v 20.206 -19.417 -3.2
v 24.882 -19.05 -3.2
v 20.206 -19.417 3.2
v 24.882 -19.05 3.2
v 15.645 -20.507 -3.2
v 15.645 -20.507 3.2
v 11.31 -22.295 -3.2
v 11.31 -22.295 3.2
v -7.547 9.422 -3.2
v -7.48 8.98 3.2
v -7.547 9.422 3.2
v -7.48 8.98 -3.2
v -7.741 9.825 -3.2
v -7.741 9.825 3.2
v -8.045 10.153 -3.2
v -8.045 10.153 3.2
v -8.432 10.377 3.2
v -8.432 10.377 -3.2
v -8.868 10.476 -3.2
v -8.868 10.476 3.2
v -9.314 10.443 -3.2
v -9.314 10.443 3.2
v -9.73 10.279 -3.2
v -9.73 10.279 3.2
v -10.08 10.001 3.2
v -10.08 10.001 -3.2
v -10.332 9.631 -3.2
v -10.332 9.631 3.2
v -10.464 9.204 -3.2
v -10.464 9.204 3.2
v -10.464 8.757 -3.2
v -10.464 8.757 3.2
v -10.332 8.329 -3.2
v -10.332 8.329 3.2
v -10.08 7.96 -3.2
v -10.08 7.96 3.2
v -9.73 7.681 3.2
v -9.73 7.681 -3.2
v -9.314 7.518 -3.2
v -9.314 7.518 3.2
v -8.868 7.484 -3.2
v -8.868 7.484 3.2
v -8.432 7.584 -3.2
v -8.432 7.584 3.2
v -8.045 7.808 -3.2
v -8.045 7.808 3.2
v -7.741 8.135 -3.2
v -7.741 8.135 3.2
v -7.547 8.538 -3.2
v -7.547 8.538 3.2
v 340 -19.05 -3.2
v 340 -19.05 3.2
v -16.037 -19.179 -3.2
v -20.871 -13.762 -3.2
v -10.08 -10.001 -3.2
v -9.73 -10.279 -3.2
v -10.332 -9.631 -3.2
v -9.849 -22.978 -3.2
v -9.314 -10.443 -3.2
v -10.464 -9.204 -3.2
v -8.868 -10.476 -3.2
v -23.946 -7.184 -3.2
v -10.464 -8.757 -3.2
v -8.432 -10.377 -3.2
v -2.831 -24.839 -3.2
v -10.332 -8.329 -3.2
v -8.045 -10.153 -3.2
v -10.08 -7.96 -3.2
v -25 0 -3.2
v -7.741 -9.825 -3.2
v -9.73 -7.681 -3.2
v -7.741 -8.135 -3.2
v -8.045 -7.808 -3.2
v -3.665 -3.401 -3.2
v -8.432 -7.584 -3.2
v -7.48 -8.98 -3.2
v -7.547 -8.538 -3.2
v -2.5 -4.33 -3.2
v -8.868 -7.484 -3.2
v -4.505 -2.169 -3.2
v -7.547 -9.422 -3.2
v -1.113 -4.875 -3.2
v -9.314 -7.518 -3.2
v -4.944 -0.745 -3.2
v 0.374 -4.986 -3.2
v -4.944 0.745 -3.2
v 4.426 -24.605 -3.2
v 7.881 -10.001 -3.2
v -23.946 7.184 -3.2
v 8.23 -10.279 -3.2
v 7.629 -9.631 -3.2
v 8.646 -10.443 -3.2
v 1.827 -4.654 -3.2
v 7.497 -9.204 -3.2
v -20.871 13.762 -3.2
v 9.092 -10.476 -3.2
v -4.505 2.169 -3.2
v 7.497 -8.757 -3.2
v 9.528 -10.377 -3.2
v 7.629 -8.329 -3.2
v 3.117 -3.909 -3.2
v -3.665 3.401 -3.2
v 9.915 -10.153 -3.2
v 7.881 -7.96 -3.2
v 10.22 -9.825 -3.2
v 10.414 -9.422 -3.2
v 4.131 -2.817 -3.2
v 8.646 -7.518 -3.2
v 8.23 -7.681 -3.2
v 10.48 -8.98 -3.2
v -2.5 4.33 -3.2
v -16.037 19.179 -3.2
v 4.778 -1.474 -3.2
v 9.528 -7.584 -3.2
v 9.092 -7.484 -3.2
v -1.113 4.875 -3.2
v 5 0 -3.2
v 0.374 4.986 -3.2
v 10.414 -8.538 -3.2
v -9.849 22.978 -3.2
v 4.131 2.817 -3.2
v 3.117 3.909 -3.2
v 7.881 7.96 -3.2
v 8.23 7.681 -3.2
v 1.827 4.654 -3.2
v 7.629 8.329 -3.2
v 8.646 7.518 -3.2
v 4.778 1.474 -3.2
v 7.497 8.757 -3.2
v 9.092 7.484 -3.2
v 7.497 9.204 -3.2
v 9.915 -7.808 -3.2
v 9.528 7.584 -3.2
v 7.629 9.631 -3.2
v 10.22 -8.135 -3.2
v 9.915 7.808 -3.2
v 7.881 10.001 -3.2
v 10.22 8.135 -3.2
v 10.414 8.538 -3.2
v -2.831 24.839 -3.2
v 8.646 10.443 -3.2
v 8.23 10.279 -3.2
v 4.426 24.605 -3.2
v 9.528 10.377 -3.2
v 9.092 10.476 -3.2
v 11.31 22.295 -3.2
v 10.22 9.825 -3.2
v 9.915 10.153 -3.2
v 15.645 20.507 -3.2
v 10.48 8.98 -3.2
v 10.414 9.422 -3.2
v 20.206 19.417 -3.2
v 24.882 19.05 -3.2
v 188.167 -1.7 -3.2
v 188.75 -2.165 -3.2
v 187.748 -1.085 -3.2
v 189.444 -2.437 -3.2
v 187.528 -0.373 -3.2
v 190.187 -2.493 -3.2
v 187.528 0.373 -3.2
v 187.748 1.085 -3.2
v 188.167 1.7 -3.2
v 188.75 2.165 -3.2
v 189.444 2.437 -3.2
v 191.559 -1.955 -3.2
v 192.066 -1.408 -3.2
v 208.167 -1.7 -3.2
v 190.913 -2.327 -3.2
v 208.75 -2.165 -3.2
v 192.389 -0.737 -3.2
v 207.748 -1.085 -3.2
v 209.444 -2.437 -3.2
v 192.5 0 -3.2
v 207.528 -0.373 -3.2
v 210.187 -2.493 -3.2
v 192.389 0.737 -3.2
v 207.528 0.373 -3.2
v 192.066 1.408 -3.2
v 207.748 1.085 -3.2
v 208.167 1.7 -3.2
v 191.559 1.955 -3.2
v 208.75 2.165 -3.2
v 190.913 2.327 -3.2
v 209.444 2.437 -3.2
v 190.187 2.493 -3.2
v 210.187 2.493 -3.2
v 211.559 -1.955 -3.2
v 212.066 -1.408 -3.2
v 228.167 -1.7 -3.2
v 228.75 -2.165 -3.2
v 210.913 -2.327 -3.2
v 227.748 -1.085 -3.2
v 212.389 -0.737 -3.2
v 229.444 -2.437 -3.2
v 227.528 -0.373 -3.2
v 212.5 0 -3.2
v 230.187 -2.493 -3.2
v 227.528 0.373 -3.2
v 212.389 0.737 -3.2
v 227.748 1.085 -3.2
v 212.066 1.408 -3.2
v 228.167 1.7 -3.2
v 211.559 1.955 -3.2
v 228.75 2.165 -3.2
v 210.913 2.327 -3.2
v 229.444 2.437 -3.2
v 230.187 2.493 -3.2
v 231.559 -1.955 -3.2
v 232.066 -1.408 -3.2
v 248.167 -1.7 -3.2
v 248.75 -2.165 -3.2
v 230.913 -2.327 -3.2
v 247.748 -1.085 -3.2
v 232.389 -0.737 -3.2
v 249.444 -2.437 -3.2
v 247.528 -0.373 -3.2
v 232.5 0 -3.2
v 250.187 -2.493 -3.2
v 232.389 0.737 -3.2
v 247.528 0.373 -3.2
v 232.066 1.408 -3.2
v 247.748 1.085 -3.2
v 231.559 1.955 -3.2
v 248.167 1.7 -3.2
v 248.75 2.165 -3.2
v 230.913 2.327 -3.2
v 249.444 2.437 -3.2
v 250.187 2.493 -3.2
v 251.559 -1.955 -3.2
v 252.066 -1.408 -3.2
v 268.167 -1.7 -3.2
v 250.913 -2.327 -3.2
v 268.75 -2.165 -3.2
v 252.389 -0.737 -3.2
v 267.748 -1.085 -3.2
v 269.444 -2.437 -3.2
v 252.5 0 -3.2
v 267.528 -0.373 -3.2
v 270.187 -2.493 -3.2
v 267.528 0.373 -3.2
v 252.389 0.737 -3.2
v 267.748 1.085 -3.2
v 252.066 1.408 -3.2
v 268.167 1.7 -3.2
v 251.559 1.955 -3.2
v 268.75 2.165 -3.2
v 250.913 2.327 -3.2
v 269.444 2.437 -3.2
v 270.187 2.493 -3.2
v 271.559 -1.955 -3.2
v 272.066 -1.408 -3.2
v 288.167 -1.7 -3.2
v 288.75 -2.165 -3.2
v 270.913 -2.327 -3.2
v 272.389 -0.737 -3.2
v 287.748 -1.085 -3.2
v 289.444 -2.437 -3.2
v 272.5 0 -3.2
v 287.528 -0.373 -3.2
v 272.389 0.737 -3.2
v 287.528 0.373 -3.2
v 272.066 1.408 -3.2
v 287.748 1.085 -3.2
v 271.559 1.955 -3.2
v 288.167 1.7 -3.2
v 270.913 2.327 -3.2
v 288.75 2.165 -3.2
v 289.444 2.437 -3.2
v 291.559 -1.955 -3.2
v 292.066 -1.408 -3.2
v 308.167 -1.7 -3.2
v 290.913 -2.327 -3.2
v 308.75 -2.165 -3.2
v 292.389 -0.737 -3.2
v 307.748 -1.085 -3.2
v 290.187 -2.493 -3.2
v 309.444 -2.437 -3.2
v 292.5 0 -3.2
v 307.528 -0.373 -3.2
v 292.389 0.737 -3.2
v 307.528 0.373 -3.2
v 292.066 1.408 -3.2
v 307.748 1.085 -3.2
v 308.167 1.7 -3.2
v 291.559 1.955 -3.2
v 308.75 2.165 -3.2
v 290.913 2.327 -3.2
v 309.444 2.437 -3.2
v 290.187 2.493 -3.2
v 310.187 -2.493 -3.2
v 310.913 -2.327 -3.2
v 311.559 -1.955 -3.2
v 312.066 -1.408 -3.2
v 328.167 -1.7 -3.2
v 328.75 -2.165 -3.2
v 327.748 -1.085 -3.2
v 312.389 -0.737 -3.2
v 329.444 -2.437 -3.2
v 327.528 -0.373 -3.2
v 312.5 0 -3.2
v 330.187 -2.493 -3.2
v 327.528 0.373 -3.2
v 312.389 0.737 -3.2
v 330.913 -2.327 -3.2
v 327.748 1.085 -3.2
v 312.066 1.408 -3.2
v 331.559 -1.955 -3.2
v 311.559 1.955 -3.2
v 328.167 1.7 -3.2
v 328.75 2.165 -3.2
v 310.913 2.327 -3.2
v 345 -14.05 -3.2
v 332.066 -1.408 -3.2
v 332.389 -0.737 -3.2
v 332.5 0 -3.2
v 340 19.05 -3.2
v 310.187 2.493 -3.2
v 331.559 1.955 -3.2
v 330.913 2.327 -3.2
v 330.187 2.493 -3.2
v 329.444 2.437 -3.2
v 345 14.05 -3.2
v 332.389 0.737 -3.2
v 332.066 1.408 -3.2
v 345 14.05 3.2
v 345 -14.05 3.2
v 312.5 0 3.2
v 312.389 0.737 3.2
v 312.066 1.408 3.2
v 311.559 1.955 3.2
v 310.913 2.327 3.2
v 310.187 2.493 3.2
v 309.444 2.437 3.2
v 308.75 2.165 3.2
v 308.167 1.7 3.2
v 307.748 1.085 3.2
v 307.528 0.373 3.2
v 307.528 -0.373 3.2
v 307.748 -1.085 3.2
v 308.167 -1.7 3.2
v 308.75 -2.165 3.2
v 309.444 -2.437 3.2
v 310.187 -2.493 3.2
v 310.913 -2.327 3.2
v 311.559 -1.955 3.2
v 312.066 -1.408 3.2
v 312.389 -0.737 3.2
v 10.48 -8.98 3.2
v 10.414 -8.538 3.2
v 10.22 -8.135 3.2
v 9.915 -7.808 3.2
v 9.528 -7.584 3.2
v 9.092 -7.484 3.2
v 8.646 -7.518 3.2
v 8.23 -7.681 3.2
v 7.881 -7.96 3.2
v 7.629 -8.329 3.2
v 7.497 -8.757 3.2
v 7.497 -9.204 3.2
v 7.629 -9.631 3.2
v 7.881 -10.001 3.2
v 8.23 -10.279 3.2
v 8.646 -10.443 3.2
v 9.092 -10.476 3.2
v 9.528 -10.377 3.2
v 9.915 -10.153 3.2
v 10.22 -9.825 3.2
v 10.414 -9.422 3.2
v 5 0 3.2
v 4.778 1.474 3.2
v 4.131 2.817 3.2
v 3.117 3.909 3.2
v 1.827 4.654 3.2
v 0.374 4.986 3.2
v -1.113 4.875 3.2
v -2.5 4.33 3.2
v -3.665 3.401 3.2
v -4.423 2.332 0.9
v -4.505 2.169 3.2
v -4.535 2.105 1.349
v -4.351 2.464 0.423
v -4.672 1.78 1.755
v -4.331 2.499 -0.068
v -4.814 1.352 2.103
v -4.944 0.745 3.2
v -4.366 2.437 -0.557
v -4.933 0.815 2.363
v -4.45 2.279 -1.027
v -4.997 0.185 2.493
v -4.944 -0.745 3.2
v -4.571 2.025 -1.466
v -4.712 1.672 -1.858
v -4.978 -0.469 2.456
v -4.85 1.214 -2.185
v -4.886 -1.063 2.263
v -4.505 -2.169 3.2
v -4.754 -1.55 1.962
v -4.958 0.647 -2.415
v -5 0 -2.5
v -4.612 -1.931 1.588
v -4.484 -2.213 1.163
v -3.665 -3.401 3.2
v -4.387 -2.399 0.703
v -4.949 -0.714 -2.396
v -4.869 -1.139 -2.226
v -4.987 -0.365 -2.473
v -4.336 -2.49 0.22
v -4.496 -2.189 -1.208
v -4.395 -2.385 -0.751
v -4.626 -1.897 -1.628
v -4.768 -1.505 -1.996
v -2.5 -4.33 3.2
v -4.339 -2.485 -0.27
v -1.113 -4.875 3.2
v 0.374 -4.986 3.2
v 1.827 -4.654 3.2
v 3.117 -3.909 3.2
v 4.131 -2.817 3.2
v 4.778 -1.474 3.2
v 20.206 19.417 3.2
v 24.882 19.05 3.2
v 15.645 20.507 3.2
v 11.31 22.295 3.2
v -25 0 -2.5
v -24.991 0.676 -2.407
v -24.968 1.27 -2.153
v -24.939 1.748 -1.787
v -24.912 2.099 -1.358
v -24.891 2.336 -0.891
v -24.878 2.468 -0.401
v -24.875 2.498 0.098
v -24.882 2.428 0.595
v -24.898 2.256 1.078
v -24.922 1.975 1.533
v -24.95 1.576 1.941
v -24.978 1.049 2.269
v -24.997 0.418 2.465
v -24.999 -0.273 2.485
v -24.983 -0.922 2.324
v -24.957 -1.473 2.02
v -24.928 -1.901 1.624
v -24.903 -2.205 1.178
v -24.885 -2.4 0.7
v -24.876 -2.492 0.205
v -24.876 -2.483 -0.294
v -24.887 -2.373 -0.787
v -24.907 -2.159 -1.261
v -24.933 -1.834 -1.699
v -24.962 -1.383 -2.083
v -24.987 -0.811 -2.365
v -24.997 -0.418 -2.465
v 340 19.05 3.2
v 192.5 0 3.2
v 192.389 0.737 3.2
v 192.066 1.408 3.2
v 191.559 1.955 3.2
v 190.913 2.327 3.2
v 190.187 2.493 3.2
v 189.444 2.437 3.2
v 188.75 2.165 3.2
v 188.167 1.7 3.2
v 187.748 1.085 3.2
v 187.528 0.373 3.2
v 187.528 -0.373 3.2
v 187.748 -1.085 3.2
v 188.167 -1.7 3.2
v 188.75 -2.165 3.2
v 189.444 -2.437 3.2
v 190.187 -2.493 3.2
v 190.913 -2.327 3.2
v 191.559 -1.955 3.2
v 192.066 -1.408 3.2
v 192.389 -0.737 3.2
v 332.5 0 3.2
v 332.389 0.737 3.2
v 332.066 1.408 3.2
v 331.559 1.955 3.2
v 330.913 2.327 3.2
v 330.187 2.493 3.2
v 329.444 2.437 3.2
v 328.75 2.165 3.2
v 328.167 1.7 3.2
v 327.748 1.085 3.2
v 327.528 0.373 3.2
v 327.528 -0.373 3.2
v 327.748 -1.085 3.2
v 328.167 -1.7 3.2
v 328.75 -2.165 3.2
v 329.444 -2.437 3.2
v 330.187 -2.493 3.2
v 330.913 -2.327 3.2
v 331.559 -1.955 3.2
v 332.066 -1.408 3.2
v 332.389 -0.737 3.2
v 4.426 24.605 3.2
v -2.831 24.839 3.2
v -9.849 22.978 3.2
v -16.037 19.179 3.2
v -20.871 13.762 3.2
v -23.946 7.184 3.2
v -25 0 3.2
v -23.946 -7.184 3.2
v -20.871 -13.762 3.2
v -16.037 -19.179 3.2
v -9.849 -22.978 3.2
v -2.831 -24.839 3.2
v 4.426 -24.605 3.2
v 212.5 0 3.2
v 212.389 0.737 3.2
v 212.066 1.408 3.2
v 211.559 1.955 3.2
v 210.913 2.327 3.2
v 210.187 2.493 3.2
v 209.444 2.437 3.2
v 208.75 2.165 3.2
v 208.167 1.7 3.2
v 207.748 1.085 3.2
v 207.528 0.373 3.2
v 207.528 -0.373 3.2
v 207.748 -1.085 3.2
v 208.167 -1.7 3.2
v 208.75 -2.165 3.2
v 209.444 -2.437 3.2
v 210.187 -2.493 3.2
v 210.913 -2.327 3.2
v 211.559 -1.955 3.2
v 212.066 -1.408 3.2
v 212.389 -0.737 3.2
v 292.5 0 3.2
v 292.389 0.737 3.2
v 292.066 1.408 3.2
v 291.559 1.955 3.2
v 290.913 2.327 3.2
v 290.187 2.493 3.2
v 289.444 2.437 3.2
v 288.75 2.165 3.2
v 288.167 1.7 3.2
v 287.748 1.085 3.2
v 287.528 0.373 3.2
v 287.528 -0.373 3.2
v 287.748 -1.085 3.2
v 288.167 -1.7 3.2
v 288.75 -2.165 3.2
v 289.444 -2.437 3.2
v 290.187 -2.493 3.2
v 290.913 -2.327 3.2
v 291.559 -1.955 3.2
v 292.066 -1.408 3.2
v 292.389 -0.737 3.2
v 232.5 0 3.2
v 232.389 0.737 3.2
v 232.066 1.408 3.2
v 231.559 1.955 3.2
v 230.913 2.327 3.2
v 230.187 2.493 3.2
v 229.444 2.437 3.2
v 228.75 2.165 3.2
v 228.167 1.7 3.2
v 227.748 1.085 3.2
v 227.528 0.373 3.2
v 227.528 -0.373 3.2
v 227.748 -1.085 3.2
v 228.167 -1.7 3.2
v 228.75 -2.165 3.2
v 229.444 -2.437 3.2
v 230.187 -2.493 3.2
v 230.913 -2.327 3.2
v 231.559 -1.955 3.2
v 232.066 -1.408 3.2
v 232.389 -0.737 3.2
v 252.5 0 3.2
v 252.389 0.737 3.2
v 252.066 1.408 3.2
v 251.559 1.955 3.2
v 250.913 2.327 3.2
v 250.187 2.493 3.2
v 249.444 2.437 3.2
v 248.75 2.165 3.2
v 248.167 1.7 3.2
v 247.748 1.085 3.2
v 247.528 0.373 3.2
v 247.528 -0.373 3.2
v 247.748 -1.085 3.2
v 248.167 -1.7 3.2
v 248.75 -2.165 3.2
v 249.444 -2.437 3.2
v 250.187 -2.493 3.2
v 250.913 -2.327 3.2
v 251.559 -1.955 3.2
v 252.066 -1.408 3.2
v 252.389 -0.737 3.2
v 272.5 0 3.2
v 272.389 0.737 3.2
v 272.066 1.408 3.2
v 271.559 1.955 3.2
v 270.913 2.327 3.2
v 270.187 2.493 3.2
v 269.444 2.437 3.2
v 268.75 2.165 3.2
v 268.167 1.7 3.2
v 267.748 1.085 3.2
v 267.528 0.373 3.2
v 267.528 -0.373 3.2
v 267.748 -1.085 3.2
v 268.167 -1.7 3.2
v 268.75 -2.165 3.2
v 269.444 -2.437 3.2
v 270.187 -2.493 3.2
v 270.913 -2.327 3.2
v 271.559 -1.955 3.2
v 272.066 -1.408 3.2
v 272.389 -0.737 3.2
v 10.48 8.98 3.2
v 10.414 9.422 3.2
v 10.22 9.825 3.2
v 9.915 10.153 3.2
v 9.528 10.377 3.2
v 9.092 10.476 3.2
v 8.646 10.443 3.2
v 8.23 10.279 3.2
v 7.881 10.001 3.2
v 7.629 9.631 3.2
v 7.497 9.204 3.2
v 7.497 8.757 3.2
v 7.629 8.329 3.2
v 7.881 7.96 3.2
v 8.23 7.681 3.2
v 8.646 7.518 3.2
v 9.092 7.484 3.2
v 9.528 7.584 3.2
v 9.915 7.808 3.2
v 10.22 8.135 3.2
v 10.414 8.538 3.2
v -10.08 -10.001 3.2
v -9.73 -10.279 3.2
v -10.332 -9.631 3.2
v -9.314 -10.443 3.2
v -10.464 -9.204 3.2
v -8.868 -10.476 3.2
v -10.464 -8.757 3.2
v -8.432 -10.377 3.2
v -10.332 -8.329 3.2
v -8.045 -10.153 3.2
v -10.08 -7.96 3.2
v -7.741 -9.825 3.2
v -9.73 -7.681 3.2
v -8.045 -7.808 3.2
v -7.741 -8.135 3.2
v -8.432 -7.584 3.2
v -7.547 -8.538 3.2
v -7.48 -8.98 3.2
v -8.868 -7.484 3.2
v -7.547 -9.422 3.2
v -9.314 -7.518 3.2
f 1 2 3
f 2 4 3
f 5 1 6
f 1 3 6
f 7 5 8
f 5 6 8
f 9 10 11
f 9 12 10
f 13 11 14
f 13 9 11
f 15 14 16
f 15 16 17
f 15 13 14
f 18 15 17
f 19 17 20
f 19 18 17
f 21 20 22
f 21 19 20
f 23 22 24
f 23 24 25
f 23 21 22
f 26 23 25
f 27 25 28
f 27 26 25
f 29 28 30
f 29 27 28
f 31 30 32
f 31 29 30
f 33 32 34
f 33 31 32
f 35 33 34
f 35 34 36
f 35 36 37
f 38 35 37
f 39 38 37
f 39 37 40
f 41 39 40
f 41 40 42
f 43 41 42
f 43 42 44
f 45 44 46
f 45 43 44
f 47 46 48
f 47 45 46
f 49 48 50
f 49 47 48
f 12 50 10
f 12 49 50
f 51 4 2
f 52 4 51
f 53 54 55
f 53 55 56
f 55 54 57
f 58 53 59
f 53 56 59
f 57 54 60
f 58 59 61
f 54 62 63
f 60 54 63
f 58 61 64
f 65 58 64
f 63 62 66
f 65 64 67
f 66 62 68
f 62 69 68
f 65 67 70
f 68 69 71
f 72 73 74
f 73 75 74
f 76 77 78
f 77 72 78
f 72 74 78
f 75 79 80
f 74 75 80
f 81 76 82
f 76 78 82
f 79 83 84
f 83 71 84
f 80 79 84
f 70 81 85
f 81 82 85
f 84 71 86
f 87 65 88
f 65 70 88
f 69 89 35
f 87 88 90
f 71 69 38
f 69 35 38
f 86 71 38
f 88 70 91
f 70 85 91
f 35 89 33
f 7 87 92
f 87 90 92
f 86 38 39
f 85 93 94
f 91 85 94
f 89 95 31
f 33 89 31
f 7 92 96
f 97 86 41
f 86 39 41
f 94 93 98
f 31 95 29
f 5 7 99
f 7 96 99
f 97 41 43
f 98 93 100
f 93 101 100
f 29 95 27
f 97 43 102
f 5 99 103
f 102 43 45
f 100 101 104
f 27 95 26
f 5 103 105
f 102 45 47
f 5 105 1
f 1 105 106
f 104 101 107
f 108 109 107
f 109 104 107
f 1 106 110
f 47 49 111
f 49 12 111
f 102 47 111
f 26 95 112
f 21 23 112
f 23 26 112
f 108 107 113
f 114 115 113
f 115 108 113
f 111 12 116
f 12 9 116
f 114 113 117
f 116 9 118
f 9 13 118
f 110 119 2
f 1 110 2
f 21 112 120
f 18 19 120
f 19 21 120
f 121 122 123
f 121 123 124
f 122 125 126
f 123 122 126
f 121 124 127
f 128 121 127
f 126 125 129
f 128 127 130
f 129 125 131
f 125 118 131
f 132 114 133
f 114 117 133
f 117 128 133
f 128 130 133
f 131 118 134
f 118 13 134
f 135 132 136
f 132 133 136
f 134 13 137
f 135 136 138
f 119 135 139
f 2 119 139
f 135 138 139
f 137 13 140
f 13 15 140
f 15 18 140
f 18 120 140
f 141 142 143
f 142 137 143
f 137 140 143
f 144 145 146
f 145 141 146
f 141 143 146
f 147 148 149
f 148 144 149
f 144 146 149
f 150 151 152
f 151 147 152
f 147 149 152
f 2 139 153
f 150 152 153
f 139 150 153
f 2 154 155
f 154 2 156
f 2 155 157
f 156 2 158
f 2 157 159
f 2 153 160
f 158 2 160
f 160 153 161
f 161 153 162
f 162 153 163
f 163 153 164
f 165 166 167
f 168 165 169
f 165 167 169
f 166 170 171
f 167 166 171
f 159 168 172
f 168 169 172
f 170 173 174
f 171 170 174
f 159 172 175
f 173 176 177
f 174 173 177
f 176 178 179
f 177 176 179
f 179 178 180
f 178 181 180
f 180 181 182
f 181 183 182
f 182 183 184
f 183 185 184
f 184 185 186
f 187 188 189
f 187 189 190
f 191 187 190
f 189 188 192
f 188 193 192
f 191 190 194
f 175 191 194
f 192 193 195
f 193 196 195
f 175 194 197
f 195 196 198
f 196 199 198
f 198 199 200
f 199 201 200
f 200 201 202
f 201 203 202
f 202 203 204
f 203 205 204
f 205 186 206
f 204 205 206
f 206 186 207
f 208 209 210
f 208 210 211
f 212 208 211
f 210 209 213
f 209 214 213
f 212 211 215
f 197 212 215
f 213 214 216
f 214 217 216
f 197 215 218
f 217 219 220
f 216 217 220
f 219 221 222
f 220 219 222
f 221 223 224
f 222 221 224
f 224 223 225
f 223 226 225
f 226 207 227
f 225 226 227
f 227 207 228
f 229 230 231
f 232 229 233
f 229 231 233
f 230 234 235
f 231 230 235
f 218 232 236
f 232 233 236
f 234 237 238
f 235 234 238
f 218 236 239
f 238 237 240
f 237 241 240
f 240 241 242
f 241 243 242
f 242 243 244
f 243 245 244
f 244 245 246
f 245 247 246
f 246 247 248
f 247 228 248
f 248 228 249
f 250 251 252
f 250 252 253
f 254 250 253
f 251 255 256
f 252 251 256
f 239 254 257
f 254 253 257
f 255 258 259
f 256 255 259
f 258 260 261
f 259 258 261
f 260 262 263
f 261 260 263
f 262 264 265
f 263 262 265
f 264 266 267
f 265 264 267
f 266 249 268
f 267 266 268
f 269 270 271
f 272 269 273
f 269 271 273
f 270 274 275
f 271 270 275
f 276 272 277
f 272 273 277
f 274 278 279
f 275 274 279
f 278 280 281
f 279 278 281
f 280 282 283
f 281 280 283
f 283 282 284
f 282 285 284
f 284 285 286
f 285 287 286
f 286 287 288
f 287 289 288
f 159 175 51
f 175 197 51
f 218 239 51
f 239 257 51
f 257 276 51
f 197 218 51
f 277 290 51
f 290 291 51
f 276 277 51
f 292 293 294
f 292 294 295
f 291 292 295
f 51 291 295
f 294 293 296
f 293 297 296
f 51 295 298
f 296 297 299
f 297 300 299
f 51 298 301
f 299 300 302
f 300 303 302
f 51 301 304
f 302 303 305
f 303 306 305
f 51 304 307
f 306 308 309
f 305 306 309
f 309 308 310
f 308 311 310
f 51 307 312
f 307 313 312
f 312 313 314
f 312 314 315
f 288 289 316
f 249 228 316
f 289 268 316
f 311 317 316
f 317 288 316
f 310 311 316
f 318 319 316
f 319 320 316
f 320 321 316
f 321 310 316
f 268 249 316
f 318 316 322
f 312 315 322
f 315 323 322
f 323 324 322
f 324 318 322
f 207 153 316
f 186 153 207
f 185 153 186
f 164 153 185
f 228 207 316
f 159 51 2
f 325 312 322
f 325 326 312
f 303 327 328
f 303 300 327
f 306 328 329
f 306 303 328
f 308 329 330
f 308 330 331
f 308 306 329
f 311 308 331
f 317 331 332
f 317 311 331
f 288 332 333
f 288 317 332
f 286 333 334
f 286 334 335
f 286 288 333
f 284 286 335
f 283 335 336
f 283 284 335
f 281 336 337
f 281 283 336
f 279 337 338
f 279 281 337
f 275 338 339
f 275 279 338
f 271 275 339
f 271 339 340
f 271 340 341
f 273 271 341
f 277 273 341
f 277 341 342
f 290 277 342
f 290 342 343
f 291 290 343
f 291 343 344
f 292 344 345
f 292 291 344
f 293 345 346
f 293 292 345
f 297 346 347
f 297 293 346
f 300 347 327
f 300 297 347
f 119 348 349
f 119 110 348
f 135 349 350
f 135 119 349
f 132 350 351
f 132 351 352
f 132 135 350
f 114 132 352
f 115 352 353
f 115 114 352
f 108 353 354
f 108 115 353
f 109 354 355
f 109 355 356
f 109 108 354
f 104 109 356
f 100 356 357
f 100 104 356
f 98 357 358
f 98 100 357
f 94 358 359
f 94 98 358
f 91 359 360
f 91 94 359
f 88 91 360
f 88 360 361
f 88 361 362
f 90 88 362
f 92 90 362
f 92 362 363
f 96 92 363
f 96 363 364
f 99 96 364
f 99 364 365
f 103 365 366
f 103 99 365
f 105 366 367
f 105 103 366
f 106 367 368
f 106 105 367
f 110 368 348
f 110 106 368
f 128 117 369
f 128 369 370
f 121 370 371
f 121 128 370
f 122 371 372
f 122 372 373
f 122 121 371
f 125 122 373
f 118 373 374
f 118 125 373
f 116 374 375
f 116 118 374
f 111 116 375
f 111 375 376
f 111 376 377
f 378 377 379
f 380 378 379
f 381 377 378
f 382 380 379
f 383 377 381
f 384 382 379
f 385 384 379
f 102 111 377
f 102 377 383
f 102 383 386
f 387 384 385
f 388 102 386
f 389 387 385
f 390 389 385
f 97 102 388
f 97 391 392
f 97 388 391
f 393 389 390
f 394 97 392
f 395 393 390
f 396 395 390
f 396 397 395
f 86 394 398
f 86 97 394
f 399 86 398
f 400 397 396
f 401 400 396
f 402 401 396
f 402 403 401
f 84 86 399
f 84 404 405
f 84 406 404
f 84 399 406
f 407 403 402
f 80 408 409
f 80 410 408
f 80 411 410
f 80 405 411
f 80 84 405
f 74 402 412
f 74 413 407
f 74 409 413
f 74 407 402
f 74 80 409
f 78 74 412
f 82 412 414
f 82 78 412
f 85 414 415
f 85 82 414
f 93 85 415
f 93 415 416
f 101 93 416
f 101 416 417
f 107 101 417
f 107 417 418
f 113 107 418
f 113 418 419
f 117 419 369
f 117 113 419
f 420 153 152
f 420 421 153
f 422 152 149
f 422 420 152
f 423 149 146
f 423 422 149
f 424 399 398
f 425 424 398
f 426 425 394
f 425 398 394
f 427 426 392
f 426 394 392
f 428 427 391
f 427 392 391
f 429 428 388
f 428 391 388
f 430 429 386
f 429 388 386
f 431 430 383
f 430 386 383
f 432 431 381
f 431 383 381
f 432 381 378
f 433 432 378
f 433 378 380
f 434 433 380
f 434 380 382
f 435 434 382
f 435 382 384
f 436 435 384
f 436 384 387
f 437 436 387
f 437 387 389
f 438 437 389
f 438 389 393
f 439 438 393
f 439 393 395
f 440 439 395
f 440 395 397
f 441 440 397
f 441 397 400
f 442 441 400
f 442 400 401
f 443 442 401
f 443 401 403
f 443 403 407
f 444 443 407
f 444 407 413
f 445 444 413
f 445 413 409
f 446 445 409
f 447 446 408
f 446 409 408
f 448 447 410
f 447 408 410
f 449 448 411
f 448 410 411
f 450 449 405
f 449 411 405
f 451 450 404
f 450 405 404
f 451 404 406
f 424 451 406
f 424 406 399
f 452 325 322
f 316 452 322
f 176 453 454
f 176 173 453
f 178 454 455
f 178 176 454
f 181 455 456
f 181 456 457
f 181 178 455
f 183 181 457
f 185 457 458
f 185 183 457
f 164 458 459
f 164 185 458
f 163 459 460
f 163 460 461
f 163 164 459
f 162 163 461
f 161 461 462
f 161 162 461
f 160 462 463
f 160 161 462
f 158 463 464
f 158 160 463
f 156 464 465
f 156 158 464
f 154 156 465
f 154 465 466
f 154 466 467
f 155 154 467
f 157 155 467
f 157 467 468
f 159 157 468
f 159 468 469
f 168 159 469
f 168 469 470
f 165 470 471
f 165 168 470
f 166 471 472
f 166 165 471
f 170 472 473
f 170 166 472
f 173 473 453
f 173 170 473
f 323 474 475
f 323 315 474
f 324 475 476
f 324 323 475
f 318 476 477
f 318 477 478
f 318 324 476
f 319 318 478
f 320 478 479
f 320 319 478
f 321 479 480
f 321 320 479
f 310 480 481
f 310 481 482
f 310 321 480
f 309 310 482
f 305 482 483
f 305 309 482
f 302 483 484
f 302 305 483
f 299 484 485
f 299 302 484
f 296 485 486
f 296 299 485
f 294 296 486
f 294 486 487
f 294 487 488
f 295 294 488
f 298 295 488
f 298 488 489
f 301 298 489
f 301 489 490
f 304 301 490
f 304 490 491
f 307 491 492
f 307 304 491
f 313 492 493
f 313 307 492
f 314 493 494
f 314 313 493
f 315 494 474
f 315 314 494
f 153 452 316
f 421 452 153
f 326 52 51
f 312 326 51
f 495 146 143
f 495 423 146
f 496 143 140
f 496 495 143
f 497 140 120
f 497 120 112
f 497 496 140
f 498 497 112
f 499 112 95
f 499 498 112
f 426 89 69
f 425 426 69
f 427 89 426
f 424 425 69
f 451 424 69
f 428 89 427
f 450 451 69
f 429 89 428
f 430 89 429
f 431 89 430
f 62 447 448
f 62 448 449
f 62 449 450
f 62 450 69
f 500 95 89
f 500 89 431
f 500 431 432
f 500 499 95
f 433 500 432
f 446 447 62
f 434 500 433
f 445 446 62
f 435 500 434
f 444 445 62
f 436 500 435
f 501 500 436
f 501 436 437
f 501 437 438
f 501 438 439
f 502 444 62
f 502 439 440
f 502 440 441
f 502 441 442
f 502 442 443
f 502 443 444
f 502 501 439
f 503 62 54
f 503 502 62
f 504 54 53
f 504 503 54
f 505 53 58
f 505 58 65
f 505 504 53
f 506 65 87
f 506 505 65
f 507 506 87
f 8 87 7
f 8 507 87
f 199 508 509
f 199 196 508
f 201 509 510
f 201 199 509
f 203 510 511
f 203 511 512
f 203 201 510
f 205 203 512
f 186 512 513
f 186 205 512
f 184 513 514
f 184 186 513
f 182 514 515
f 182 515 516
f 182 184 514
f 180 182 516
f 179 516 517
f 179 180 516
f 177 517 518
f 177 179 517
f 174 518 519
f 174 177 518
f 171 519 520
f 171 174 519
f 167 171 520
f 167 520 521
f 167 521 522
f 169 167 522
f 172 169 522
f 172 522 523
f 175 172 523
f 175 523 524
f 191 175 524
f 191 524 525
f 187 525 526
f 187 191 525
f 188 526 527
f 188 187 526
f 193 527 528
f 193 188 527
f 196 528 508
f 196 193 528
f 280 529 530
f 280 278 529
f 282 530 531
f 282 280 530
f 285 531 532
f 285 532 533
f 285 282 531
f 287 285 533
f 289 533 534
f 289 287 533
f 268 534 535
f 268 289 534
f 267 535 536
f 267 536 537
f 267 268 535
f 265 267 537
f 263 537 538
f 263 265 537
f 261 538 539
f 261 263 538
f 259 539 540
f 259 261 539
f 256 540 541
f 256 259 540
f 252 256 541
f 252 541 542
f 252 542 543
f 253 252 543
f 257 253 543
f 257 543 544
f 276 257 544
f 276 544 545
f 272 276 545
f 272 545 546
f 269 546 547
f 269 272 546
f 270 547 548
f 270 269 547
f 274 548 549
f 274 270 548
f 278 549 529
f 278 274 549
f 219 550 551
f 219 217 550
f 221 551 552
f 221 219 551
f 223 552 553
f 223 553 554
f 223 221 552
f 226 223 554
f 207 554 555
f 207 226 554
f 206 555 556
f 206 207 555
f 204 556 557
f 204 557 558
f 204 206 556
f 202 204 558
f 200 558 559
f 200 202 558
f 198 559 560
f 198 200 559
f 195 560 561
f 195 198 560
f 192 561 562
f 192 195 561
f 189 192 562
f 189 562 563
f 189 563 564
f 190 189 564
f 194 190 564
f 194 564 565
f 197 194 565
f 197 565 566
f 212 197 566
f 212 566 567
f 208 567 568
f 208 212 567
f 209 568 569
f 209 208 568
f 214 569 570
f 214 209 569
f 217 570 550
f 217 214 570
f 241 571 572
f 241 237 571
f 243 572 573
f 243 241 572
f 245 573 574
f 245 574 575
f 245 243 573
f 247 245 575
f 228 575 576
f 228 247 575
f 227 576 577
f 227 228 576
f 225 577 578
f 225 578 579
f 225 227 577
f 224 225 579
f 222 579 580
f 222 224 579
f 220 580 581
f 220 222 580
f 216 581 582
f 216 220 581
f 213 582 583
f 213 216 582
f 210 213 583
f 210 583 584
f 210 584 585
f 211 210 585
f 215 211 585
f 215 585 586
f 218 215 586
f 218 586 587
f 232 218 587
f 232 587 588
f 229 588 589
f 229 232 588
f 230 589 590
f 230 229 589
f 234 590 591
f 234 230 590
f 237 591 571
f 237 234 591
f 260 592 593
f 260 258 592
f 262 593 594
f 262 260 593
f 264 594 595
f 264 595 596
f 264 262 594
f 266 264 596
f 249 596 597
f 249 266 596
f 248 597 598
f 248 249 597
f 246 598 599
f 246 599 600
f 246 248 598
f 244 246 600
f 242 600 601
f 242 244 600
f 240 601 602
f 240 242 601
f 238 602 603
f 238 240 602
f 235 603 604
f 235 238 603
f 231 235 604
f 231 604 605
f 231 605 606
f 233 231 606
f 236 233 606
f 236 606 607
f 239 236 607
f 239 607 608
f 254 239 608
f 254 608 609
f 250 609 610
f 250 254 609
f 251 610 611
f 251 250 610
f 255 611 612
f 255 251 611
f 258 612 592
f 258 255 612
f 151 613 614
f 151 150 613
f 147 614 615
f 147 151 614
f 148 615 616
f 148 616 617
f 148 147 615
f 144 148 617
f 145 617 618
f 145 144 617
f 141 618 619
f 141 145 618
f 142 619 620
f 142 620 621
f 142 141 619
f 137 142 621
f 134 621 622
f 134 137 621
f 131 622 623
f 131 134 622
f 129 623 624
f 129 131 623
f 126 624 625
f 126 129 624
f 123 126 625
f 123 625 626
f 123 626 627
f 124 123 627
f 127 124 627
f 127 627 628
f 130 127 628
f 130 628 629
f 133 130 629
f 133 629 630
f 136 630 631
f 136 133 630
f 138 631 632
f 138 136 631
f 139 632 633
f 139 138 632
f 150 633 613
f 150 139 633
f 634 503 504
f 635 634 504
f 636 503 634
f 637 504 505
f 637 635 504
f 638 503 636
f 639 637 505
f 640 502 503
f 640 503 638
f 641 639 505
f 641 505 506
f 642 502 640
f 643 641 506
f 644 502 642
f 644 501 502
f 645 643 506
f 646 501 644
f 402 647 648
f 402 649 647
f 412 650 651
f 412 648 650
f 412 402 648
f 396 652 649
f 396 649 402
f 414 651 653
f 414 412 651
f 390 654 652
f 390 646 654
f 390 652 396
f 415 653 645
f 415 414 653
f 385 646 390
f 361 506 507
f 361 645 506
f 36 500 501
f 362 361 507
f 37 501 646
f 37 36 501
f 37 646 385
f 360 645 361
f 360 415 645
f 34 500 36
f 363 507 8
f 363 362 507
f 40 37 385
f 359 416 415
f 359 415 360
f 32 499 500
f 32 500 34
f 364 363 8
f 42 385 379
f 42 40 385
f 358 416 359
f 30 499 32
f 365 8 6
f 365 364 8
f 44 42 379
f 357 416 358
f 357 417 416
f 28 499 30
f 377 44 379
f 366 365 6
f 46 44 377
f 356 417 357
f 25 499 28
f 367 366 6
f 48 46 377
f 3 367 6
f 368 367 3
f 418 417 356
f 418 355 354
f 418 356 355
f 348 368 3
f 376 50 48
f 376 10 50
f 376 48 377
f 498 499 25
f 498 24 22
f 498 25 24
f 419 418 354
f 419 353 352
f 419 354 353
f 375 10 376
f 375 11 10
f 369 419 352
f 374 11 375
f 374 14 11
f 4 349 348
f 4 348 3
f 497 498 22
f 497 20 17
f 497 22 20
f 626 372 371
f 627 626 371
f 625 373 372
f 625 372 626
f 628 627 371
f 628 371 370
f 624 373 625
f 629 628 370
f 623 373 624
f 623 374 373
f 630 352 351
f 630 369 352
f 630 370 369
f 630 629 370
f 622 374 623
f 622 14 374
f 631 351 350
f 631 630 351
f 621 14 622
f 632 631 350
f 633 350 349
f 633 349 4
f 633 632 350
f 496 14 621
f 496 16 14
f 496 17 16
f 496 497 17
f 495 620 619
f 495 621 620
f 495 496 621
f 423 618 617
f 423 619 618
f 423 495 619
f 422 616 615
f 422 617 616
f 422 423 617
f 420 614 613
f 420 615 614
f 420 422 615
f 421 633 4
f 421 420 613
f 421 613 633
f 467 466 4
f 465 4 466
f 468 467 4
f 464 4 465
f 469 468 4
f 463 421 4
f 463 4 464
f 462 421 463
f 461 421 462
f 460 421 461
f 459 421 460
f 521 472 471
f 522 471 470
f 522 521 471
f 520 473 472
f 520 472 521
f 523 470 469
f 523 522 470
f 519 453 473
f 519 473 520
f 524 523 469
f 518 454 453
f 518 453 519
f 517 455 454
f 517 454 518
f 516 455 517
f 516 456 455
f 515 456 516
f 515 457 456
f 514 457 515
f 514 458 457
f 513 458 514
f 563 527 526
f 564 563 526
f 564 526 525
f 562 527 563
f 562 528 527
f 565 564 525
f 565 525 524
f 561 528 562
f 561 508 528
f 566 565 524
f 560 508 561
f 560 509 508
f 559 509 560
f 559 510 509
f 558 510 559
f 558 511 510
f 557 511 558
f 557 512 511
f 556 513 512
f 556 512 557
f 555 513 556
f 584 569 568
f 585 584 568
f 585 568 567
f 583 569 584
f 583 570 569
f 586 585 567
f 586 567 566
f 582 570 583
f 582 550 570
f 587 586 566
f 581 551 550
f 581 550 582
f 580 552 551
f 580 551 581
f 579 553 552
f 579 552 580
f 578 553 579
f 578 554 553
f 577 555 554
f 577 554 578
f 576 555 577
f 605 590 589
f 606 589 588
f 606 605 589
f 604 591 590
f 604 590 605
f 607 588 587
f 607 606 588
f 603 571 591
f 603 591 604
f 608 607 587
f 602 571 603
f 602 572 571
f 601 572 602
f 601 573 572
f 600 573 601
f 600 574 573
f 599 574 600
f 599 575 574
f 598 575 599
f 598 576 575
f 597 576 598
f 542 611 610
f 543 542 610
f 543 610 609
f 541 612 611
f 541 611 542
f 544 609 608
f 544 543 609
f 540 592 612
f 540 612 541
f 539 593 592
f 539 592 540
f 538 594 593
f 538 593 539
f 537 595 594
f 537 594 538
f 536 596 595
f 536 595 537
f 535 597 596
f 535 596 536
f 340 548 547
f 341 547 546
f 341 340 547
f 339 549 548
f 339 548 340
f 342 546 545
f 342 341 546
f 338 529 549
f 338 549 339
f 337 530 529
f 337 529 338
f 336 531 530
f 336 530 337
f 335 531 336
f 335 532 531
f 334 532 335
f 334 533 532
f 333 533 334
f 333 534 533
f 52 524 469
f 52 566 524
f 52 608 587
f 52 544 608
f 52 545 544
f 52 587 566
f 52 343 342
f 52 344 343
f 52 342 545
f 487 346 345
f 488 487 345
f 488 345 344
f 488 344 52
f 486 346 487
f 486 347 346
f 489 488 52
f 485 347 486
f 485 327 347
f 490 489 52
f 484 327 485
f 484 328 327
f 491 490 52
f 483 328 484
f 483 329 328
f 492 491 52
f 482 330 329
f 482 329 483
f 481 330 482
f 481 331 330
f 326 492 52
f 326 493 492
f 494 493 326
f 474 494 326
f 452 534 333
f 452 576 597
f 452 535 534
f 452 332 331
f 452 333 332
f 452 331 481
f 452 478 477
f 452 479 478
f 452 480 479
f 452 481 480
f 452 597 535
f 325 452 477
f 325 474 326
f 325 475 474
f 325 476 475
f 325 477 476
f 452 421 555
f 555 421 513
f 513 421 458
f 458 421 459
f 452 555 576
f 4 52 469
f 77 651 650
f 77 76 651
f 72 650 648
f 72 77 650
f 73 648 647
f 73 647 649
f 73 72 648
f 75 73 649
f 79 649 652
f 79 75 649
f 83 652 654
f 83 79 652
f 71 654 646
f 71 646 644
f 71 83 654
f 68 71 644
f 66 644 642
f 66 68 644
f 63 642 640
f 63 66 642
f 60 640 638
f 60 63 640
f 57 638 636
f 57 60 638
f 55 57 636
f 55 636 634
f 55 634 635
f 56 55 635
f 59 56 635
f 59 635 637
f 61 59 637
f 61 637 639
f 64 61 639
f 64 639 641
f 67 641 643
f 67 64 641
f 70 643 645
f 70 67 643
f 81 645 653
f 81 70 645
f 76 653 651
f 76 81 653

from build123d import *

# Parameters (mm, degrees)
SKETCH1_R               = 1.5
SKETCH1_R_2             = 5
SKETCH1_R_3             = 2.5
BOSS_EXTRUDE1_DEPTH     = 3.2
FILLET1_R               = 30
CHAMFER1_SIZE           = 5
CUT_EXTRUDE1_REACH      = 347.919
CUT_EXTRUDE1_END_RADIUS = 25
SKETCH3_R               = 2.5


with BuildPart() as part:
    # Sketch1 → Boss-Extrude1 (new, symmetric)
    with BuildSketch(Plane.XY):
        with BuildLine():
            Line((345, 19.05), (16.189425561, 19.05))
            ThreePointArc((16.189425561, 19.05), (-25, 0), (16.189425561, -19.05))
            Line((16.189425561, -19.05), (345, -19.05))
            Line((345, -19.05), (345, 19.05))
        make_face()
        with Locations((8.980256121, 8.980256121)):
            Circle(SKETCH1_R, mode=Mode.SUBTRACT)
        Circle(SKETCH1_R_2, mode=Mode.SUBTRACT)
        with Locations((330, 0)):
            Circle(SKETCH1_R_3, mode=Mode.SUBTRACT)
        with Locations((310, 0)):
            Circle(SKETCH1_R_3, mode=Mode.SUBTRACT)
        with Locations((290, 0)):
            Circle(SKETCH1_R_3, mode=Mode.SUBTRACT)
        with Locations((270, 0)):
            Circle(SKETCH1_R_3, mode=Mode.SUBTRACT)
        with Locations((250, 0)):
            Circle(SKETCH1_R_3, mode=Mode.SUBTRACT)
        with Locations((230, 0)):
            Circle(SKETCH1_R_3, mode=Mode.SUBTRACT)
        with Locations((210, 0)):
            Circle(SKETCH1_R_3, mode=Mode.SUBTRACT)
        with Locations((190, 0)):
            Circle(SKETCH1_R_3, mode=Mode.SUBTRACT)
        with Locations((8.980256121, -8.980256121)):
            Circle(SKETCH1_R, mode=Mode.SUBTRACT)
        with Locations((-8.980256121, -8.980256121)):
            Circle(SKETCH1_R, mode=Mode.SUBTRACT)
        with Locations((-8.980256121, 8.980256121)):
            Circle(SKETCH1_R, mode=Mode.SUBTRACT)
    extrude(amount=BOSS_EXTRUDE1_DEPTH, both=True)

    # Fillet1
    fillet1_edges = [part.edges().sort_by_distance(p)[0] for p in [
        (16.189425561, -19.05, 0),
        (16.189425561, 19.05, 0),
    ]]
    fillet(fillet1_edges, radius=FILLET1_R)

    # Chamfer1
    chamfer1_edges = [part.edges().sort_by_distance(p)[0] for p in [
        (345, -19.05, 0),
        (345, 19.05, 0),
    ]]
    chamfer(chamfer1_edges, length=CHAMFER1_SIZE)

    # Cut-Extrude1: up to this cylinder (the profile starts inside it)
    cut_extrude1_end = Plane(origin=(0, 0, 0), z_dir=(0, 0, -1)) * Cylinder(CUT_EXTRUDE1_END_RADIUS, 746.838, mode=Mode.PRIVATE)
    # Sketch3 → Cut-Extrude1 (cut, up to the surface)
    with BuildSketch(Plane(origin=(0, 0, 0), x_dir=(0, 0, -1), z_dir=(1, 0, 0)), mode=Mode.PRIVATE) as cut_extrude1_sk1:
        Circle(SKETCH3_R)
    cut_extrude1_tool1 = extrude(cut_extrude1_sk1.sketch, amount=-CUT_EXTRUDE1_REACH, mode=Mode.PRIVATE) & cut_extrude1_end
    add(cut_extrude1_tool1.solids().sort_by_distance((0, 0, 0))[0], mode=Mode.SUBTRACT)


solid = part.part
